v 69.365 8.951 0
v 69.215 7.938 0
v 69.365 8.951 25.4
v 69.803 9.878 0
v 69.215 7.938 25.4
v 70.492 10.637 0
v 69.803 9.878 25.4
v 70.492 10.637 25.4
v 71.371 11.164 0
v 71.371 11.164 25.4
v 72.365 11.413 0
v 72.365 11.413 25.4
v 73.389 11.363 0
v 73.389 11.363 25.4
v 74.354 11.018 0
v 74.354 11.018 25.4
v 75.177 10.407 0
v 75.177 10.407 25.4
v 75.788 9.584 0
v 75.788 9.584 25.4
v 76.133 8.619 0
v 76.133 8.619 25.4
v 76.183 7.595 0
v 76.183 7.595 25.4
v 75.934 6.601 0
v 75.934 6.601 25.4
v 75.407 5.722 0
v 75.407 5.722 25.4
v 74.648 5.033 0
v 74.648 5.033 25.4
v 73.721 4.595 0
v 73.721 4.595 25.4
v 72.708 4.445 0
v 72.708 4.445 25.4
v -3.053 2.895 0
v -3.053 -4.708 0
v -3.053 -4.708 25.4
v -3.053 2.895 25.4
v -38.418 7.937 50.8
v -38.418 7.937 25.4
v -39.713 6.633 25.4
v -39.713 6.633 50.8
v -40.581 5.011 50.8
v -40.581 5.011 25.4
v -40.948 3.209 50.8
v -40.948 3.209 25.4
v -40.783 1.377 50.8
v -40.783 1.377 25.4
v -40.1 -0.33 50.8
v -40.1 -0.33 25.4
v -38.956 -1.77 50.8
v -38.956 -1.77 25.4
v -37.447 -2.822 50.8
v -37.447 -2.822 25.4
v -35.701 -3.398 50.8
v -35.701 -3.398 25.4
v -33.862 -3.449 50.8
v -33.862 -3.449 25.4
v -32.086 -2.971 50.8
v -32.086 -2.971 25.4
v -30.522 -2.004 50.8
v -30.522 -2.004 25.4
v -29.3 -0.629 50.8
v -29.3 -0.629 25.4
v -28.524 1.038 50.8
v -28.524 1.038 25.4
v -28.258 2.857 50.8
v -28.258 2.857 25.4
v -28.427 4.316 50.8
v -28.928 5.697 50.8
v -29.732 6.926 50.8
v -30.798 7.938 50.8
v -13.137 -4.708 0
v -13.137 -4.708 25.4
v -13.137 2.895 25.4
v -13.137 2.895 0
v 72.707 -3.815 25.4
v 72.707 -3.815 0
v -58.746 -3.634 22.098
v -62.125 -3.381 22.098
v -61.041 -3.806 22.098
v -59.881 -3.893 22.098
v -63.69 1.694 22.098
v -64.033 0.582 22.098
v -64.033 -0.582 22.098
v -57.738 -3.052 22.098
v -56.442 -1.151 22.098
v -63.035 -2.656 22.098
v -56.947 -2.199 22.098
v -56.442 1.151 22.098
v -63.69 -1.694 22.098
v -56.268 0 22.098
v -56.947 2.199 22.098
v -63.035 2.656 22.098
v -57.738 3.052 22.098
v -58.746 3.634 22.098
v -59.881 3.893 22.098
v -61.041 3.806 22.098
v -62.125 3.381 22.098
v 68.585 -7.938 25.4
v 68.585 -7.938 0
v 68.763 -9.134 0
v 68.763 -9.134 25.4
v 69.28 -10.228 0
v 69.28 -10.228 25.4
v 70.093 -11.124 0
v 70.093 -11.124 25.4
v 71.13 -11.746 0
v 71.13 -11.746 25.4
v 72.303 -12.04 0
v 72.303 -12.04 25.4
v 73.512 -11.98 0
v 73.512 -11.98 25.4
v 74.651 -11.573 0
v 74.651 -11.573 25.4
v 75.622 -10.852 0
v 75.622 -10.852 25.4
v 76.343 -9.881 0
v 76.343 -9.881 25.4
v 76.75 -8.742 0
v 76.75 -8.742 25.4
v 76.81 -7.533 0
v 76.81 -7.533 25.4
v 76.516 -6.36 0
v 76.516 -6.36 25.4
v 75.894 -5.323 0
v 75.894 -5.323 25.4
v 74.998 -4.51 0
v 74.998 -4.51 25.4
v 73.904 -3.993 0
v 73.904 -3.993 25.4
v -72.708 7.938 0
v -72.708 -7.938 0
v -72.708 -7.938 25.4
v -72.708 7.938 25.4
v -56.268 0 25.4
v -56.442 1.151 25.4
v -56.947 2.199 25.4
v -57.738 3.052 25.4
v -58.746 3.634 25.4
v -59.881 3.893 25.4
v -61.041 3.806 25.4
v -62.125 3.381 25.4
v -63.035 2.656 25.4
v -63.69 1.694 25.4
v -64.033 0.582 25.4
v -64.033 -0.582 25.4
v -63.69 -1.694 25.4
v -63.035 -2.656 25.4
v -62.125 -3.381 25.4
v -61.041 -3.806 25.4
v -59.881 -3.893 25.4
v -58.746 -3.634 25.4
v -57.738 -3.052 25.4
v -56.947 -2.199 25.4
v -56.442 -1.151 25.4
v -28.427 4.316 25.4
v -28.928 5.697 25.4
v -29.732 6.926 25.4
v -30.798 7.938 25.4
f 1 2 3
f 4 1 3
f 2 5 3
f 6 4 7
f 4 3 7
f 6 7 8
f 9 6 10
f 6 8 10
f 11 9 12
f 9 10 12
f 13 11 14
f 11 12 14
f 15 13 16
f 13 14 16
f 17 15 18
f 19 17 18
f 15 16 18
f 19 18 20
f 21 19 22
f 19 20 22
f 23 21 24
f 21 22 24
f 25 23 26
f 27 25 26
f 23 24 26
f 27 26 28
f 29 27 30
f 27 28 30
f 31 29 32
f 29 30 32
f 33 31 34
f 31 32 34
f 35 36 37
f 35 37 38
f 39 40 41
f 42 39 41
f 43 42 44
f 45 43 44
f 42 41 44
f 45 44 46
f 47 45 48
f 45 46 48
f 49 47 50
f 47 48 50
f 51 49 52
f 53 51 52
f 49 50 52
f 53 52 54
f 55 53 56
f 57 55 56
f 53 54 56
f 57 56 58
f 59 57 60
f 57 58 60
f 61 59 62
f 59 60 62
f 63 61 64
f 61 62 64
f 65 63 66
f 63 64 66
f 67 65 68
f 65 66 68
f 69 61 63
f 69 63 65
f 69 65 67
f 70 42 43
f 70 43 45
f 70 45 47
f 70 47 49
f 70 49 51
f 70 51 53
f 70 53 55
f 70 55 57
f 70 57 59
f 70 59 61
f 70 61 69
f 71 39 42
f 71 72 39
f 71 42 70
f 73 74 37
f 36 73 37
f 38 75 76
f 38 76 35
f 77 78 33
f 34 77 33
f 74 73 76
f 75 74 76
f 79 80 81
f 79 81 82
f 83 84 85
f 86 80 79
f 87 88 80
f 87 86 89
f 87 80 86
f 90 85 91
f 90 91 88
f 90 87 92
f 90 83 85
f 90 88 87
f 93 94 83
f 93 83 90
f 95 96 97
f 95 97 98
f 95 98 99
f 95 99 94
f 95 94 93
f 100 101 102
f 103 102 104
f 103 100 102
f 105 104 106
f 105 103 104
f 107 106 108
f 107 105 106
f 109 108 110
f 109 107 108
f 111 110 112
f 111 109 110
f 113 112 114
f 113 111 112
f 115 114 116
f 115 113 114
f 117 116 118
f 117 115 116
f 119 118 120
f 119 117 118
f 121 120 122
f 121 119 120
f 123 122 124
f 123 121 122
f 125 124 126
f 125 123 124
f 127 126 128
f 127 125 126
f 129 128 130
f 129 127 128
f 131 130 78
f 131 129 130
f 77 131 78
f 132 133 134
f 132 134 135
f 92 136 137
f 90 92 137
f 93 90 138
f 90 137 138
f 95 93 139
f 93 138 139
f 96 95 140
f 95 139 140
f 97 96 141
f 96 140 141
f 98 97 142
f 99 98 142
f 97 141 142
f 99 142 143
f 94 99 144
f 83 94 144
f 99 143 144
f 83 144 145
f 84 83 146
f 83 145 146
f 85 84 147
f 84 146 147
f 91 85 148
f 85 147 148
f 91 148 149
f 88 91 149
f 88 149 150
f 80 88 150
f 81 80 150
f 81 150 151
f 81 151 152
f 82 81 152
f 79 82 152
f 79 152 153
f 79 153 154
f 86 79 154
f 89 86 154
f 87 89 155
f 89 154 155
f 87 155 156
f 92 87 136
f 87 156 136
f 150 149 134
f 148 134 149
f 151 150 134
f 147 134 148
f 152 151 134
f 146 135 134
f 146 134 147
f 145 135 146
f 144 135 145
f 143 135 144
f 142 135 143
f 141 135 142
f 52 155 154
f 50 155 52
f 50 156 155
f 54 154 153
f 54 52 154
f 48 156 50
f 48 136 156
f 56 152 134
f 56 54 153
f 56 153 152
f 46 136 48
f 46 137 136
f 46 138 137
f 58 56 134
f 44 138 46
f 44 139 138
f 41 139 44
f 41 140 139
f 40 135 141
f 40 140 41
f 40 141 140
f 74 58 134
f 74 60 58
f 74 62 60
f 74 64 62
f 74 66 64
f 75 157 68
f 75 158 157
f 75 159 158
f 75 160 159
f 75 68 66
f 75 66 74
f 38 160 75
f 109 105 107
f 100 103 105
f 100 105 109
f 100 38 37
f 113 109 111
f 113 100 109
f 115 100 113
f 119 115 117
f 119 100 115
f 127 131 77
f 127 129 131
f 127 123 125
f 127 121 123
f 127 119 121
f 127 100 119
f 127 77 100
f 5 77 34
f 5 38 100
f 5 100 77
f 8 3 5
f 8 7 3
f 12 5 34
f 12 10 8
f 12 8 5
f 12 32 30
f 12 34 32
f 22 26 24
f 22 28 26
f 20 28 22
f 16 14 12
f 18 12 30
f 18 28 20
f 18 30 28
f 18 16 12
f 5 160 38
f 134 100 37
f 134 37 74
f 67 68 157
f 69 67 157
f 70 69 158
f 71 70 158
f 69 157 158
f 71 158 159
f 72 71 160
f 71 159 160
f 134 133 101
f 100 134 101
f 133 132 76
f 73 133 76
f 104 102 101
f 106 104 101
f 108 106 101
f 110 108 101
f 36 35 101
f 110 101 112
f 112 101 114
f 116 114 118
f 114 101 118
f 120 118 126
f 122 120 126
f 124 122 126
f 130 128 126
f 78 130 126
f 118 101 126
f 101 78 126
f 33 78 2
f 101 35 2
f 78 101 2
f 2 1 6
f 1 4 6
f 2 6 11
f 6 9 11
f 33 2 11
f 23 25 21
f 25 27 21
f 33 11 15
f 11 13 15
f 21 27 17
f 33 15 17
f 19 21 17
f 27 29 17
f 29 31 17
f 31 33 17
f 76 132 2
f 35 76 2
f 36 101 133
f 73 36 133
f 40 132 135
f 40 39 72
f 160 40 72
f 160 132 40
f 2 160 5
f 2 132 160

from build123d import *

# Parameters (mm, degrees)
F0_W      = 145.415
F0_H      = 15.875
F1_DEPTH  = 25.4
F3_DEPTH  = 25.4
F2_R      = 3.9042600658
F4_DEPTH  = 3.302
F5_W      = 10.0848590955
F5_H      = 7.6029407792
F6_DEPTH  = 25.4
F7_W      = 3.4926307648
F7_H      = 25.4
F9_R      = 4.1220063289
F10_DEPTH = 25.4


with BuildPart() as f1:
    # F0 (on Top) → F1 (new body)
    with BuildSketch(Plane.XY):
        Rectangle(F0_W, F0_H)
    extrude(amount=F1_DEPTH)

    # F2 (on face) → F3 (join)
    with BuildSketch(Plane.XY.offset(25.4)):
        with BuildLine():
            ThreePointArc((-38.4175, 7.9375), (-37.4473063314, -2.8221126628), (-28.2575, 2.8575))
            ThreePointArc((-28.2575, 2.8575), (-28.9278873372, 5.6973063314), (-30.7975, 7.9375))
            Line((-30.7975, 7.9375), (-38.4175, 7.9375))
        make_face()
    extrude(amount=F3_DEPTH)

    # F2 (on face) → F4 (cut)
    with BuildSketch(Plane.XY.offset(25.4)):
        with Locations((-60.1726733148, 0)):
            Circle(F2_R)
    extrude(amount=-F4_DEPTH, mode=Mode.SUBTRACT)

    # F5 (on face) → F6 (cut, through all)
    with BuildSketch(Plane.XY.offset(25.4)):
        with Locations((-8.0950618722, -0.9069514927)):
            Rectangle(F5_W, F5_H)
    extrude(amount=-F6_DEPTH, mode=Mode.SUBTRACT)

    # F7 (on face) → F8 (revolve)
    with BuildSketch(Plane.YZ.offset(72.7075)):
        with Locations((6.1911846176, 12.7)):
            Rectangle(F7_W, F7_H)
    revolve(axis=Axis((72.7075, 7.9375, 12.7), (0, 0, -1)))

    # F9 (on face) → F10 (join, through all)
    with BuildSketch(Plane.XY.offset(25.4)):
        with Locations((72.7075, -7.9375)):
            Circle(F9_R)
    extrude(amount=-F10_DEPTH)


solid = f1.part
